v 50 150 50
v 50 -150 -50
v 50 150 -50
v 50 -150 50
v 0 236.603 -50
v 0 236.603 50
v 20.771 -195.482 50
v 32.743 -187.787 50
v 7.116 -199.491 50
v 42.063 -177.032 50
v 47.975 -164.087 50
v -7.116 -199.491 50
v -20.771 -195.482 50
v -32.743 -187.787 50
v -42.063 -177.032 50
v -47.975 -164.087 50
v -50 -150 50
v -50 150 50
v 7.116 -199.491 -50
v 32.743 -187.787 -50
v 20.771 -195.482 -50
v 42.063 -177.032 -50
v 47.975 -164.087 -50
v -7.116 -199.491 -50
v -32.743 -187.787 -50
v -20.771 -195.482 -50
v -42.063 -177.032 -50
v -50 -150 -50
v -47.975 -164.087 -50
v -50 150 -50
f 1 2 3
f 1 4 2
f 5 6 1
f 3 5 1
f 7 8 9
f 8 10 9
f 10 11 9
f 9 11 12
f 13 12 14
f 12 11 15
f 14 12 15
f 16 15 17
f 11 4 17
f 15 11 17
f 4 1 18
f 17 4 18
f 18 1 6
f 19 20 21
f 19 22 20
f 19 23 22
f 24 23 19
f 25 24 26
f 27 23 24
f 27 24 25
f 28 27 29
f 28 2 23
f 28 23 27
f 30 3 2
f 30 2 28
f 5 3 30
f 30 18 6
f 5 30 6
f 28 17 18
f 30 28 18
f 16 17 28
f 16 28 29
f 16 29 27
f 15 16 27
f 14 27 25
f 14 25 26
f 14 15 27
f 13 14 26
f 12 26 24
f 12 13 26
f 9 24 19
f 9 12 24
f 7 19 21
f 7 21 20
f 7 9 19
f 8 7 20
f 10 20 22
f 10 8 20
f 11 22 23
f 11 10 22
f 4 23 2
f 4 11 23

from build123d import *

# Parameters (mm, degrees)
CROQUIS2_W              = 100
CROQUIS2_H              = 300
SALIENTE_EXTRUIR2_DEPTH = 50


with BuildPart() as part:
    # Croquis2 → Saliente-Extruir2 (new body, symmetric)
    with BuildSketch(Plane.XY):
        Polygon((0, 236.602540378), (50, 150), (-50, 150), align=None)
        Rectangle(CROQUIS2_W, CROQUIS2_H)
        with BuildLine():
            Line((50, -150), (-50, -150))
            ThreePointArc((-50, -150), (0, -200), (50, -150))
        make_face()
    extrude(amount=SALIENTE_EXTRUIR2_DEPTH, both=True)


solid = part.part
